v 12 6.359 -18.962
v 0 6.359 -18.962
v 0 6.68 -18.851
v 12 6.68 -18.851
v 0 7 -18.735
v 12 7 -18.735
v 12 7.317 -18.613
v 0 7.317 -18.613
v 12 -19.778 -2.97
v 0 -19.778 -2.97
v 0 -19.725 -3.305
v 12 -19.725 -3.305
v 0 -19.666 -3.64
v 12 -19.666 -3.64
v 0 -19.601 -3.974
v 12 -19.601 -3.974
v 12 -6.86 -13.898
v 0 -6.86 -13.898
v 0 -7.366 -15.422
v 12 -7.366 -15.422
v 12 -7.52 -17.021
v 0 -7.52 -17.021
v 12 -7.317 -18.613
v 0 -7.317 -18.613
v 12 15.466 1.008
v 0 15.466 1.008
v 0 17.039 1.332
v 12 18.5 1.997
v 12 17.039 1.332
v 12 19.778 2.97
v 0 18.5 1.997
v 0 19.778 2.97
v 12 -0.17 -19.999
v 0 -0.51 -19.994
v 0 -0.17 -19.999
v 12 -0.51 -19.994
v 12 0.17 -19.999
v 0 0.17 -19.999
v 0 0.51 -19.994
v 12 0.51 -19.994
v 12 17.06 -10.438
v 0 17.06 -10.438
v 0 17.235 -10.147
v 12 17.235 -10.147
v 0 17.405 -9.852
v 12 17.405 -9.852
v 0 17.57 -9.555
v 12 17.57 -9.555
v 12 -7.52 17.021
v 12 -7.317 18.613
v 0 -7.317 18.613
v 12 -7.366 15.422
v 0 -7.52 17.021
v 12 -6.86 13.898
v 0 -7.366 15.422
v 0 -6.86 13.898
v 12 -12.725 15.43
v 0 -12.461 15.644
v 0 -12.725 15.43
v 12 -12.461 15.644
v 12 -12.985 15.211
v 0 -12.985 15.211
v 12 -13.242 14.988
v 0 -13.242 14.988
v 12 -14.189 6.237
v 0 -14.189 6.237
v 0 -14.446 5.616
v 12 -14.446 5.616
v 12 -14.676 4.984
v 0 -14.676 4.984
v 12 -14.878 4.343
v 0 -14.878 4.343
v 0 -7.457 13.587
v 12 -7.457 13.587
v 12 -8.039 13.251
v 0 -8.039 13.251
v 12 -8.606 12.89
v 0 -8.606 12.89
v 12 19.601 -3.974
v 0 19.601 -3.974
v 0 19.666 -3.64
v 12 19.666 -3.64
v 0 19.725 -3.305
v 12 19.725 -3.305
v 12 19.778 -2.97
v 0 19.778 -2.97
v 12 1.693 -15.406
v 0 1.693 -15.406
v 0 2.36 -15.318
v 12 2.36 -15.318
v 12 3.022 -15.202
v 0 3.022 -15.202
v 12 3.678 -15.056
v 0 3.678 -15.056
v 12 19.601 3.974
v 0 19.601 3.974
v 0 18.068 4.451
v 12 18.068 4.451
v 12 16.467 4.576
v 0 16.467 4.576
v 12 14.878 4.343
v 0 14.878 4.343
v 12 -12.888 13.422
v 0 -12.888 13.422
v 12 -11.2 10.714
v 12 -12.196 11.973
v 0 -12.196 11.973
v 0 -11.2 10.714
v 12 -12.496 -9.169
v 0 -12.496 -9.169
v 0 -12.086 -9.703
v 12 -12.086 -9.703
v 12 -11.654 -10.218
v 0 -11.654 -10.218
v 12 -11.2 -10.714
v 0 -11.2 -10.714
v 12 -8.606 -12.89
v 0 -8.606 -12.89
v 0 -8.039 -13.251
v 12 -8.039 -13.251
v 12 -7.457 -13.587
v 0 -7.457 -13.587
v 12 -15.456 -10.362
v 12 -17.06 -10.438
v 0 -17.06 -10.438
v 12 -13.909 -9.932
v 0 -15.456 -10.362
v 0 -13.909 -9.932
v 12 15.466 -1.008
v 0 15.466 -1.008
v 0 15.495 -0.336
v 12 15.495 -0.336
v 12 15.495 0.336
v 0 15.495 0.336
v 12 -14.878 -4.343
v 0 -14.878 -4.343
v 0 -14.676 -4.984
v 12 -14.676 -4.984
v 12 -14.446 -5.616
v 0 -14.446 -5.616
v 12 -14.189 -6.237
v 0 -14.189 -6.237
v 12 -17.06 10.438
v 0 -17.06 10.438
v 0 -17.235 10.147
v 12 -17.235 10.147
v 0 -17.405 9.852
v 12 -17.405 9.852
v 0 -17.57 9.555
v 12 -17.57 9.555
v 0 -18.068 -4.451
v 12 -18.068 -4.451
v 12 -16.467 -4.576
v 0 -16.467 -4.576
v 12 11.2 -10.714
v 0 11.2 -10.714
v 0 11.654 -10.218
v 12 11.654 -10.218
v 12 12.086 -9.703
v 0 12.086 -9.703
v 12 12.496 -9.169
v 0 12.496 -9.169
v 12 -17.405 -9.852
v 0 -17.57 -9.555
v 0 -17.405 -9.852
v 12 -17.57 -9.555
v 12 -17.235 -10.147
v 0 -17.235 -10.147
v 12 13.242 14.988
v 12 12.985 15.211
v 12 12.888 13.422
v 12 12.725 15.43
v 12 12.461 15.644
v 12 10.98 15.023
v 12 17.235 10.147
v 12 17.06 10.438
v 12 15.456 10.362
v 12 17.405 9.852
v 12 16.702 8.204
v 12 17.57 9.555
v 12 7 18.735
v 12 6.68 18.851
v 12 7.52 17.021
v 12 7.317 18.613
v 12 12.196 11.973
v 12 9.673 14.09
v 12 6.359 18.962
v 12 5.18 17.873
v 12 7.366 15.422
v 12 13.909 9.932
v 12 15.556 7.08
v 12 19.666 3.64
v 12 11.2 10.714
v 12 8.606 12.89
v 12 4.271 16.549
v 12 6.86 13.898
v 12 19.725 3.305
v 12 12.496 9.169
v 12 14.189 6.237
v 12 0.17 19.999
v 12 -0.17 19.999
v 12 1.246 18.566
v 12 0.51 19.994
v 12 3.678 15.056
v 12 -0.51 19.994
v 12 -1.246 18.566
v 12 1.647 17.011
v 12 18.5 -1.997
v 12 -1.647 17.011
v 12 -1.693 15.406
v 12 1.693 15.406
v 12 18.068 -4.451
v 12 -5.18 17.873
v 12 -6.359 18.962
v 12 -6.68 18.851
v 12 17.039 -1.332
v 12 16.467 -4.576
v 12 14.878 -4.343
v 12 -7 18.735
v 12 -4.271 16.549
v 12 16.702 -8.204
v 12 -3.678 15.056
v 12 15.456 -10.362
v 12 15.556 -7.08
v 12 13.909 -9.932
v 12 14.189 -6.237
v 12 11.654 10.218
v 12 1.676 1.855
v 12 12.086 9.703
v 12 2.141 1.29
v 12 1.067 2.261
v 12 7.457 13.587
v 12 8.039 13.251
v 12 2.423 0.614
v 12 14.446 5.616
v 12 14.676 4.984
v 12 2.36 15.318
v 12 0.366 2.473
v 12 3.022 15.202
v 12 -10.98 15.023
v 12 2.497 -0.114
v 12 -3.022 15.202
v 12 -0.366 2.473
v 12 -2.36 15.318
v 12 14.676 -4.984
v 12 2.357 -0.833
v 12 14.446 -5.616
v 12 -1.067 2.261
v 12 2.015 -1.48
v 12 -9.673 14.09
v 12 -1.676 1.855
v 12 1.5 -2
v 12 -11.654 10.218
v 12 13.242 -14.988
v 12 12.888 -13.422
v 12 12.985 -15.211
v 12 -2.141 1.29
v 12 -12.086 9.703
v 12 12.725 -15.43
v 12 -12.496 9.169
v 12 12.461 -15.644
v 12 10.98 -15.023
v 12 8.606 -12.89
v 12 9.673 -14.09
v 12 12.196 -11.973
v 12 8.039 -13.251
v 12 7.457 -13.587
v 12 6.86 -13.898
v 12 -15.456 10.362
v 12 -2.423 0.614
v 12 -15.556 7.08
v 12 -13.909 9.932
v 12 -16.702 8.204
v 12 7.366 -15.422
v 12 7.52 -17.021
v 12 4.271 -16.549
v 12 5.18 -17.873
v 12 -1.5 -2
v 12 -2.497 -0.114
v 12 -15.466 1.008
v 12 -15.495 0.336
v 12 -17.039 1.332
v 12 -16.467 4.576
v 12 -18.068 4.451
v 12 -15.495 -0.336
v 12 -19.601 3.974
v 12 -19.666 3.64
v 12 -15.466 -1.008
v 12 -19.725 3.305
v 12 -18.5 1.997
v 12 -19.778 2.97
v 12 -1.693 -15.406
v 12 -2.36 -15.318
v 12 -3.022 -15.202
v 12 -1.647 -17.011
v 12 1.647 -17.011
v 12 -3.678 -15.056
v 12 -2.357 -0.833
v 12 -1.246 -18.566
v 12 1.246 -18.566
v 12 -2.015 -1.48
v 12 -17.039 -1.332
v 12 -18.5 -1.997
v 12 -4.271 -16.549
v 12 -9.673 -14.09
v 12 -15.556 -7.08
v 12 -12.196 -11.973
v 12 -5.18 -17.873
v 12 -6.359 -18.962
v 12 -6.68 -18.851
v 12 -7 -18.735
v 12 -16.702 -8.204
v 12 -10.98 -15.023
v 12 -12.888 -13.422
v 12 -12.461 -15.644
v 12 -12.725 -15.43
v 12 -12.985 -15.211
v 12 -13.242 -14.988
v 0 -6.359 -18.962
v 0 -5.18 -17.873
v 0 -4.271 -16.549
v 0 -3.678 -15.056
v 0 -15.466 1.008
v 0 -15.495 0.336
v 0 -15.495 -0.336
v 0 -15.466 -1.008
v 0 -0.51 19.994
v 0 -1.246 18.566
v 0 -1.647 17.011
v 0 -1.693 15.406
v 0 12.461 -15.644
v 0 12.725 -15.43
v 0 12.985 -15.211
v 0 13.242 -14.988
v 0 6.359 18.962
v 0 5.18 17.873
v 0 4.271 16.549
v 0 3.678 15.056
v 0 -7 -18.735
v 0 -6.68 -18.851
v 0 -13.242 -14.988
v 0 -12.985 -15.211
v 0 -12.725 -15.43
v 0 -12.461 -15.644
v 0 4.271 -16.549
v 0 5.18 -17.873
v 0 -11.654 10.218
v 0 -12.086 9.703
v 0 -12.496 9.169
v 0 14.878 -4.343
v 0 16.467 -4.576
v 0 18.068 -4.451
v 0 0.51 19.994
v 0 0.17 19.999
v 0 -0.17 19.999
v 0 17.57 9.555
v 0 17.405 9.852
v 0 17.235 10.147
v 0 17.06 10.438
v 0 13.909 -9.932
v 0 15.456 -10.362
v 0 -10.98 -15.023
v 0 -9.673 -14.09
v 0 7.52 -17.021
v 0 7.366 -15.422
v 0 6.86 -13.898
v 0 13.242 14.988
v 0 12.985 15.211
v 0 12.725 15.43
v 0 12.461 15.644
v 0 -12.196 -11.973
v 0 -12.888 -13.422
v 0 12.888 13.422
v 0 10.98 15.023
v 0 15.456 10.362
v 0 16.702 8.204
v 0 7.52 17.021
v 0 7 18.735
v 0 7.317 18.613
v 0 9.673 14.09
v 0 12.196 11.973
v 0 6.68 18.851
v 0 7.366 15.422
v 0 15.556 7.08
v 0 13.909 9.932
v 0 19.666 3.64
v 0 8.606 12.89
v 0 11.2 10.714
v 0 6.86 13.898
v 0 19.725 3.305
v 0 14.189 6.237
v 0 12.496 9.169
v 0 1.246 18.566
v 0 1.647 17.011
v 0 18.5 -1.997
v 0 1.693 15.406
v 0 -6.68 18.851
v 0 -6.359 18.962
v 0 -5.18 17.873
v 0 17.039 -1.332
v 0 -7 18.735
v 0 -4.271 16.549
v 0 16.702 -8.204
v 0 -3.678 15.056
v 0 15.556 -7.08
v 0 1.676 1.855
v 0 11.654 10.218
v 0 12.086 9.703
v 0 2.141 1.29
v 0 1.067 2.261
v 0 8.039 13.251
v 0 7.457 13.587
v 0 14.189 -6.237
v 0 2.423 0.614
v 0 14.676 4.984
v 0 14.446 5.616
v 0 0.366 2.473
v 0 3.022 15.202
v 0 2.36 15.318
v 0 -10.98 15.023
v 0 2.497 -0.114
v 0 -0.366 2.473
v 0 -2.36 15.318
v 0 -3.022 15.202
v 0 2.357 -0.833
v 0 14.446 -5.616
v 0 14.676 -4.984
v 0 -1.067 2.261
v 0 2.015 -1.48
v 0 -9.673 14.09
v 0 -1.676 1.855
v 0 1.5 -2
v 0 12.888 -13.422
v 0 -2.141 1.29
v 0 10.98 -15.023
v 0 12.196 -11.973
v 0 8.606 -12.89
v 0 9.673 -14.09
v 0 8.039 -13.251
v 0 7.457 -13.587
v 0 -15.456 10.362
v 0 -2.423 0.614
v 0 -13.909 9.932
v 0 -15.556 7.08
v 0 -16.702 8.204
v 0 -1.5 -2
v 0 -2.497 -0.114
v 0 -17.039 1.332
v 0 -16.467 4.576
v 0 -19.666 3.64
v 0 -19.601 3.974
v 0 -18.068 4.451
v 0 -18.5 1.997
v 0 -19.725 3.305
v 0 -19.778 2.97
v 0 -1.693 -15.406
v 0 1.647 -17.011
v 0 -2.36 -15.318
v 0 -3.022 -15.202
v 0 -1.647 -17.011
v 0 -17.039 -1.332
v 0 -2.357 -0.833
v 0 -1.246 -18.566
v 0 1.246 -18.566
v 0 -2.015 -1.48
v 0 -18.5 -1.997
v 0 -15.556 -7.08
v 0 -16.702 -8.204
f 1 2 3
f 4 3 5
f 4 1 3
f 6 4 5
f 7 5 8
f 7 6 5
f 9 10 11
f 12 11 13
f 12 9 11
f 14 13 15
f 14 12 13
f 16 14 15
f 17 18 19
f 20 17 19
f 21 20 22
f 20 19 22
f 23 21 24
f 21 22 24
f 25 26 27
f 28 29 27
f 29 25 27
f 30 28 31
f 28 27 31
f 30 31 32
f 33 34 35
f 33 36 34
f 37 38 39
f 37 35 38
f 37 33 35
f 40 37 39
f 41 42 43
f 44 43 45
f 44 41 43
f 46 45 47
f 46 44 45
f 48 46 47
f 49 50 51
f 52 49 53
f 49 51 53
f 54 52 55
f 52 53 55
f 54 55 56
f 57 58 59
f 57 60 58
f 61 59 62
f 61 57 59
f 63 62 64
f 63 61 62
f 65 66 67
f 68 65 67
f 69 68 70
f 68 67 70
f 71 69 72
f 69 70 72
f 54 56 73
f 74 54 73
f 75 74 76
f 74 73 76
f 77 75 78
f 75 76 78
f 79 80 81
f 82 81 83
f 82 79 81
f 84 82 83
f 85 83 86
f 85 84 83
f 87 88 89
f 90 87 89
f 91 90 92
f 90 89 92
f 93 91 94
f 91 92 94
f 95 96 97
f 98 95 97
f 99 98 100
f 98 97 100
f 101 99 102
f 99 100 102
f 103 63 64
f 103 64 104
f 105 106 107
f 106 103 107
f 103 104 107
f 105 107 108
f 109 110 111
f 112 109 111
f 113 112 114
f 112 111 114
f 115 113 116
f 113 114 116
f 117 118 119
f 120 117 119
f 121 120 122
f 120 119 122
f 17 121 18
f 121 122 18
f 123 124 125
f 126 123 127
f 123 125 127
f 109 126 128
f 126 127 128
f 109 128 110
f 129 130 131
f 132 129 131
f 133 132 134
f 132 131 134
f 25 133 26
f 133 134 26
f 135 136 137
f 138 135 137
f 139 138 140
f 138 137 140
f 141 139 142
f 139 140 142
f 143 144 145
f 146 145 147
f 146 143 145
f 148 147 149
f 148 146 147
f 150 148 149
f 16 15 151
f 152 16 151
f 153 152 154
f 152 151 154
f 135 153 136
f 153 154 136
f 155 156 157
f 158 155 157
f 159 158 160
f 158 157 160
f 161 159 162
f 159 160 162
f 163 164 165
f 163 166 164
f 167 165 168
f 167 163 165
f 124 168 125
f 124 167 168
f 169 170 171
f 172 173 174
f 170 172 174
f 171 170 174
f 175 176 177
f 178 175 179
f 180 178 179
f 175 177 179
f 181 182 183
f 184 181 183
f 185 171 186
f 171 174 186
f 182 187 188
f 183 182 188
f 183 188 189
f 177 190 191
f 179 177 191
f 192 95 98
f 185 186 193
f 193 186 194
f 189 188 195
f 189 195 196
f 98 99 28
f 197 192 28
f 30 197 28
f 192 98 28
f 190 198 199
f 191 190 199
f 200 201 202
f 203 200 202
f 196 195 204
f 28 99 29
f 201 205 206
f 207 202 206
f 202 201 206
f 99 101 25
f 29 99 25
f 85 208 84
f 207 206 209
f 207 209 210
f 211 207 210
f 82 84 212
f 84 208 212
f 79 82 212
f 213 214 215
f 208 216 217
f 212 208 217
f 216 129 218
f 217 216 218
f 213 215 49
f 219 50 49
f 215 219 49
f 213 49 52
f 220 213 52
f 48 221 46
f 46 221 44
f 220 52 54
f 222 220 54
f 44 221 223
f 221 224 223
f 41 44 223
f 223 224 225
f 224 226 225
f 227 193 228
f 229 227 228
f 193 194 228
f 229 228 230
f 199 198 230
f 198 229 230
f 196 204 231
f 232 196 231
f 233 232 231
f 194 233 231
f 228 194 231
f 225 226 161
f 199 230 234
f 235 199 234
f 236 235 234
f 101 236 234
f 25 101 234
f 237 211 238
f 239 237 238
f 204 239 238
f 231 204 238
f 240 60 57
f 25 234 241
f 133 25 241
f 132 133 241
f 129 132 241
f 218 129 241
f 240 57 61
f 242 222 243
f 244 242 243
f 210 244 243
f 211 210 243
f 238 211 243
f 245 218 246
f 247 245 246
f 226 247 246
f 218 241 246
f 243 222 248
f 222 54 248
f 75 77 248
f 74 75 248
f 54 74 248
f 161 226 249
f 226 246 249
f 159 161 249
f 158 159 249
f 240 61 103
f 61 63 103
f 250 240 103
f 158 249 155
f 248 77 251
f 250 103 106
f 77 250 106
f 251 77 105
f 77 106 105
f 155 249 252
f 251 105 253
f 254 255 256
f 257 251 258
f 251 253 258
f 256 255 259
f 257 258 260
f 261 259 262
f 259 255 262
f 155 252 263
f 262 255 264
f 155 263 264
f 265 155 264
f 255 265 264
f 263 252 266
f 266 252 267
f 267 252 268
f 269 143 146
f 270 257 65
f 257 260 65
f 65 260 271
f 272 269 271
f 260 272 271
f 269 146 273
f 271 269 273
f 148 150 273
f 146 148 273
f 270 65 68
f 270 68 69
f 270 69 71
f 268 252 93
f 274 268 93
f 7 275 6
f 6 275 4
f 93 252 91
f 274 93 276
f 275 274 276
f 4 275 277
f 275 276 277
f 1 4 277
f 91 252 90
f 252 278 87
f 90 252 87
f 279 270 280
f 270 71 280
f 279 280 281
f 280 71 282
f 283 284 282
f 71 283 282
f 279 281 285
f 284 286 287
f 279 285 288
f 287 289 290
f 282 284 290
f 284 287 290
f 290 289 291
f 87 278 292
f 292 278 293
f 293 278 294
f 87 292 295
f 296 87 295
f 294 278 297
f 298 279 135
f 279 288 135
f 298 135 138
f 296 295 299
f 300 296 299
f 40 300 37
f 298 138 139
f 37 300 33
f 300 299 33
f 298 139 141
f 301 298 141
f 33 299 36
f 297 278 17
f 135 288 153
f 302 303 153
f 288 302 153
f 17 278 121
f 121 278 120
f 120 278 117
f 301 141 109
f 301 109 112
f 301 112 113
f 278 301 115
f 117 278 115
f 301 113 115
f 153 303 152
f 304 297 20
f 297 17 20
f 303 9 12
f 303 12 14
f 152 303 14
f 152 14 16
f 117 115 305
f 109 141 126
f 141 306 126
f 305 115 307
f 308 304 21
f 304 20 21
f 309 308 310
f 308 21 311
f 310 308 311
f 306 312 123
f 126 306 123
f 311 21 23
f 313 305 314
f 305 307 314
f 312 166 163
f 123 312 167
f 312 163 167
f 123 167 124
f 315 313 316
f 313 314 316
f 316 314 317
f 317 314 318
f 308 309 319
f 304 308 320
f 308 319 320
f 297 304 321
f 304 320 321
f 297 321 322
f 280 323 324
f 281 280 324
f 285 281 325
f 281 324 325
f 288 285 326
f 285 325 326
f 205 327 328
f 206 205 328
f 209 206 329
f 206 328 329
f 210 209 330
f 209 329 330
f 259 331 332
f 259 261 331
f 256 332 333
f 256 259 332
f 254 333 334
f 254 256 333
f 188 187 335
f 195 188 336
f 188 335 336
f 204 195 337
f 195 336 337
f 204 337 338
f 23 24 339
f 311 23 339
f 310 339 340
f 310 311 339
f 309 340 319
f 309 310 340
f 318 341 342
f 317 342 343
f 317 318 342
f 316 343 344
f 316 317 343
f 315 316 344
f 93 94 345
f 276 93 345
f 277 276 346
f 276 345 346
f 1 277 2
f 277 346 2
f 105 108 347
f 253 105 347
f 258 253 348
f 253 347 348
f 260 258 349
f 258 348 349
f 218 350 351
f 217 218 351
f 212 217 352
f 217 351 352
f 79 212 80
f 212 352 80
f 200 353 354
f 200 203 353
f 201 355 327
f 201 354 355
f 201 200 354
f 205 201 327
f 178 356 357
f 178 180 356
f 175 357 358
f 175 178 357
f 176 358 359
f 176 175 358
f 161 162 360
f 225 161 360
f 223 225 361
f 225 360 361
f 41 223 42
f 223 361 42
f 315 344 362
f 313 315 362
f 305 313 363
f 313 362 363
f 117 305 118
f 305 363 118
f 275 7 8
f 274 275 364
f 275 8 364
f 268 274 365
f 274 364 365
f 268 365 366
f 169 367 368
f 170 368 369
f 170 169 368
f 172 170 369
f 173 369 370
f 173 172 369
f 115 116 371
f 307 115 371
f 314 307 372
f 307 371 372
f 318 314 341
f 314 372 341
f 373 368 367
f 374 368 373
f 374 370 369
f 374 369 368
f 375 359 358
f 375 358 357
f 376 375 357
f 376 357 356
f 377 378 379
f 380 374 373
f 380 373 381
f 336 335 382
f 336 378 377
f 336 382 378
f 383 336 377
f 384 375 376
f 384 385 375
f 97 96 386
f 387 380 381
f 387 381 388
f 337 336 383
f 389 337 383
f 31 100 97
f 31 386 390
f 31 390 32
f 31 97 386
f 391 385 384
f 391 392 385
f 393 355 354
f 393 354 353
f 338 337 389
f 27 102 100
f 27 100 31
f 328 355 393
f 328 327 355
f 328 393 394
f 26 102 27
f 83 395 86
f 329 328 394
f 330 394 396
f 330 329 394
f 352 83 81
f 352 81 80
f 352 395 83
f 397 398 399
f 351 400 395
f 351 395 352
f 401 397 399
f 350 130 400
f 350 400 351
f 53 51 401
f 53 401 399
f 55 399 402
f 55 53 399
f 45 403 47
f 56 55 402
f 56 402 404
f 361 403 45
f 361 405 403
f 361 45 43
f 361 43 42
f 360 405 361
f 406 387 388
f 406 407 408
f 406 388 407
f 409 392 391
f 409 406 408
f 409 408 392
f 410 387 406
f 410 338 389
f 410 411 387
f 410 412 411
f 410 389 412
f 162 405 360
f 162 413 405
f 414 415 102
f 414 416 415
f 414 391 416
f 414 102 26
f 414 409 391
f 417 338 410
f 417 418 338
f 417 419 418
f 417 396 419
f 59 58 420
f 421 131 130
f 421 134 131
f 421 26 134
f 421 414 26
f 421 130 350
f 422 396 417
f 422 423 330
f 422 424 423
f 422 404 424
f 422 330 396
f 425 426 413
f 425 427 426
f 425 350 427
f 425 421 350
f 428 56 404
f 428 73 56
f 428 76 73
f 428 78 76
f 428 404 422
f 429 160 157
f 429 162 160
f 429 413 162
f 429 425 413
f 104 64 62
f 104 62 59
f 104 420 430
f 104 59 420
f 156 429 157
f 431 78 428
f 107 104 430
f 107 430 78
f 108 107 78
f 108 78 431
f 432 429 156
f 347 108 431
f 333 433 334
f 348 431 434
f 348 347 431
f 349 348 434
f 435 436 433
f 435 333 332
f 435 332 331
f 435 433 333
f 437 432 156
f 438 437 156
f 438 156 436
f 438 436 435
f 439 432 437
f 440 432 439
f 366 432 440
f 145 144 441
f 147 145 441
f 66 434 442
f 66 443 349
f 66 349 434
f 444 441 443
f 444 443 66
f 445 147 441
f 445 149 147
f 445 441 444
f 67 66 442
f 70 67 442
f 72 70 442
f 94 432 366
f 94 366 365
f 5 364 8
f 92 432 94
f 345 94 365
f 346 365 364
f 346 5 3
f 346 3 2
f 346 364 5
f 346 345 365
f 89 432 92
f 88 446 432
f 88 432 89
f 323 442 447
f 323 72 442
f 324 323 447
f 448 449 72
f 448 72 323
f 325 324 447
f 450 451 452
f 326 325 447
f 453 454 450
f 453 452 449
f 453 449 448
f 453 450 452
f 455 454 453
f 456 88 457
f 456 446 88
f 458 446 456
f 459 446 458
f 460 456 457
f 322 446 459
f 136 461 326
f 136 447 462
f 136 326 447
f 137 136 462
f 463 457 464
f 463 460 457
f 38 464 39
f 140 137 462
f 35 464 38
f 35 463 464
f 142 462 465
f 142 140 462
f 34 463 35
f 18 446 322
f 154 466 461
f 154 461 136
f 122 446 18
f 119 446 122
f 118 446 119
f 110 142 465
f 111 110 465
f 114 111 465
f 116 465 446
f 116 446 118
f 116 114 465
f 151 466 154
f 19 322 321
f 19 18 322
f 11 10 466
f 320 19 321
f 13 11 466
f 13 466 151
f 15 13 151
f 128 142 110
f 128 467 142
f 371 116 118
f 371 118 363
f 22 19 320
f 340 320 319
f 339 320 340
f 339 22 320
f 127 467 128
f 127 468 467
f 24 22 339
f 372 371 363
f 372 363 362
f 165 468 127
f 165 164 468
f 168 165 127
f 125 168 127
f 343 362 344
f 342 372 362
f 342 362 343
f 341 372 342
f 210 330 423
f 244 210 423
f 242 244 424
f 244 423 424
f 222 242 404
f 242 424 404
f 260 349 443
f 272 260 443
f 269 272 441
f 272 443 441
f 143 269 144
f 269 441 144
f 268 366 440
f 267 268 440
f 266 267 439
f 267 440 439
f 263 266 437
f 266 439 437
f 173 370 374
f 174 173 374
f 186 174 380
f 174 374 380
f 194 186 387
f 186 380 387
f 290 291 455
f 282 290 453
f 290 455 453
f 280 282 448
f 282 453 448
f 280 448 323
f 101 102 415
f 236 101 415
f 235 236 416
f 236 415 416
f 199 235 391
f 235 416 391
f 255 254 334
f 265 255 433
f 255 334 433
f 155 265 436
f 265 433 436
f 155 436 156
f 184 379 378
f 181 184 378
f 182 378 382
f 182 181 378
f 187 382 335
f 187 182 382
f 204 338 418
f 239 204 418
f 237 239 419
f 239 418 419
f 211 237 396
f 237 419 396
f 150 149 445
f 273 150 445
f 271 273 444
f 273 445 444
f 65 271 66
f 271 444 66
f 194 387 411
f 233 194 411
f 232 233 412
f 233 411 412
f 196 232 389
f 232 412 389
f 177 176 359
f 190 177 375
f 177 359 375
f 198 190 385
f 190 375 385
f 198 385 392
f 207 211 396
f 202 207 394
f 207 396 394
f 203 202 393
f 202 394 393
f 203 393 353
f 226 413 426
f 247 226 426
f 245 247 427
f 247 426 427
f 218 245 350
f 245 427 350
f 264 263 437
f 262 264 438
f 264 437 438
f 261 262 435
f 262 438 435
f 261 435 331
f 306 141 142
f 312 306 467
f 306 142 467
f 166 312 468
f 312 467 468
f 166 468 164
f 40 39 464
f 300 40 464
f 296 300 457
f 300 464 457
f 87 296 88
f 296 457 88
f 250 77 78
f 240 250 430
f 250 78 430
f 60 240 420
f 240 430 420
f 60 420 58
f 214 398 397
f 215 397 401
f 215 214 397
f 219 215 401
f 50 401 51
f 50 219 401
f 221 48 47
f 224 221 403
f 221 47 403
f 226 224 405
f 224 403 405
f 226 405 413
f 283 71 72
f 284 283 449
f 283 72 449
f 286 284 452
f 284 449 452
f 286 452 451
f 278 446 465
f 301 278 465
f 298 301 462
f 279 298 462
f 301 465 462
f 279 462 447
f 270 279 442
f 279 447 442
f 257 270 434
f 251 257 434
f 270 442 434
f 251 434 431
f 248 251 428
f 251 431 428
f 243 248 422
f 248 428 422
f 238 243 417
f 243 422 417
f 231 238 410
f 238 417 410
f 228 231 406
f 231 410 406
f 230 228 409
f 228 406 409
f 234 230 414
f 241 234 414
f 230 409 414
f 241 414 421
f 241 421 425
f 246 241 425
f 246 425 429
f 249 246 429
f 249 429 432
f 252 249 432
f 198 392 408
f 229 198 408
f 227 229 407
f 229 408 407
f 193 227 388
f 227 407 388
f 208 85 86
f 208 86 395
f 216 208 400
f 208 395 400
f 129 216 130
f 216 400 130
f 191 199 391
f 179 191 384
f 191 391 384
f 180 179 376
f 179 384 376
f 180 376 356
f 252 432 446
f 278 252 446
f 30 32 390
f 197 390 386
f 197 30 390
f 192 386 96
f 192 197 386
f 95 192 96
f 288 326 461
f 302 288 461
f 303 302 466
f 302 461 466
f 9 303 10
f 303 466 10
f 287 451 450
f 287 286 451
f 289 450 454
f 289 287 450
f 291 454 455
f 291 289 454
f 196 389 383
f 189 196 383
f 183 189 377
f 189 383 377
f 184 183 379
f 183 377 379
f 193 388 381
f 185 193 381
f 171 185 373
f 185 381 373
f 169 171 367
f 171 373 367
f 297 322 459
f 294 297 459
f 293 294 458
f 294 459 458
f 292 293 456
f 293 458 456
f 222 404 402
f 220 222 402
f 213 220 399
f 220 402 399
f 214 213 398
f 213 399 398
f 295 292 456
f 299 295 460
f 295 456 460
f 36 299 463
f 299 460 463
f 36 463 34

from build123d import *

# Parameters (mm, degrees)
BASPROSKE_W              = 12
BASPROSKE_H              = 20
TOOTHCUT_DEPTH           = 31.724582991
TEETHCUTS_COUNT          = 18
TEETHCUTS_ANGLE          = 340
BORSKE_R                 = 0.1
BORE_DEPTH               = 50.0000508
TAGLIO_ESTRUSIONE1_DEPTH = 13


with BuildPart() as part:
    # BasProSke → Base-Revolve (revolve)
    with BuildSketch(Plane(origin=(0, 0, 0), x_dir=(1, 0, 0), z_dir=(0, 1, 0)), mode=Mode.PRIVATE) as base_revolve_sk:
        with Locations((6, 10)):
            Rectangle(BASPROSKE_W, BASPROSKE_H)
    revolve(base_revolve_sk.sketch.rotate(Axis((-10, 0, 0), (1, 0, 0)), 180), axis=Axis((-10, 0, 0), (1, 0, 0)))

    # TooCutSke → ToothCut (cut, through all)
    with BuildSketch(Plane(origin=(0, 0, 0), x_dir=(0, 0, -1), z_dir=(1, 0, 0))):
        with BuildLine():
            ThreePointArc((1.007799284, 15.466199973), (0, 15.499), (-1.007799284, 15.466199973))
            ThreePointArc((-1.007799284, 15.466199973), (-1.630454606, 17.802374148), (-2.991345877, 19.800719558))
            ThreePointArc((-2.991345877, 19.800719558), (0, 20.0254), (2.991345877, 19.800719558))
            ThreePointArc((2.991345877, 19.800719558), (1.630454606, 17.802374148), (1.007799284, 15.466199973))
        make_face()
    toothcut = extrude(amount=TOOTHCUT_DEPTH, mode=Mode.SUBTRACT)

    # TeethCuts: ToothCut ×18 about axis
    teethcuts_axis = Axis((-10, 0, 0), (1, 0, 0))
    for i in range(1, TEETHCUTS_COUNT):
        add(toothcut.rotate(teethcuts_axis, i * TEETHCUTS_ANGLE / (TEETHCUTS_COUNT - 1)), mode=Mode.SUBTRACT)

    # BorSke → Bore (cut, symmetric)
    with BuildSketch(Plane(origin=(0, 0, 0), x_dir=(0, 0, -1), z_dir=(1, 0, 0))):
        with Locations(Location((0, 0, 0), (0, 0, 180))):
            Circle(BORSKE_R)
    extrude(amount=BORE_DEPTH, both=True, mode=Mode.SUBTRACT)

    # Schizzo1 → Taglio-Estrusione1 (cut)
    with BuildSketch(Plane.ZY):
        with BuildLine():
            Line((-2, 1.5), (-2, -1.5))
            ThreePointArc((-2, -1.5), (2.5, 0), (-2, 1.5))
        make_face()
    extrude(amount=-TAGLIO_ESTRUSIONE1_DEPTH, mode=Mode.SUBTRACT)


solid = part.part
